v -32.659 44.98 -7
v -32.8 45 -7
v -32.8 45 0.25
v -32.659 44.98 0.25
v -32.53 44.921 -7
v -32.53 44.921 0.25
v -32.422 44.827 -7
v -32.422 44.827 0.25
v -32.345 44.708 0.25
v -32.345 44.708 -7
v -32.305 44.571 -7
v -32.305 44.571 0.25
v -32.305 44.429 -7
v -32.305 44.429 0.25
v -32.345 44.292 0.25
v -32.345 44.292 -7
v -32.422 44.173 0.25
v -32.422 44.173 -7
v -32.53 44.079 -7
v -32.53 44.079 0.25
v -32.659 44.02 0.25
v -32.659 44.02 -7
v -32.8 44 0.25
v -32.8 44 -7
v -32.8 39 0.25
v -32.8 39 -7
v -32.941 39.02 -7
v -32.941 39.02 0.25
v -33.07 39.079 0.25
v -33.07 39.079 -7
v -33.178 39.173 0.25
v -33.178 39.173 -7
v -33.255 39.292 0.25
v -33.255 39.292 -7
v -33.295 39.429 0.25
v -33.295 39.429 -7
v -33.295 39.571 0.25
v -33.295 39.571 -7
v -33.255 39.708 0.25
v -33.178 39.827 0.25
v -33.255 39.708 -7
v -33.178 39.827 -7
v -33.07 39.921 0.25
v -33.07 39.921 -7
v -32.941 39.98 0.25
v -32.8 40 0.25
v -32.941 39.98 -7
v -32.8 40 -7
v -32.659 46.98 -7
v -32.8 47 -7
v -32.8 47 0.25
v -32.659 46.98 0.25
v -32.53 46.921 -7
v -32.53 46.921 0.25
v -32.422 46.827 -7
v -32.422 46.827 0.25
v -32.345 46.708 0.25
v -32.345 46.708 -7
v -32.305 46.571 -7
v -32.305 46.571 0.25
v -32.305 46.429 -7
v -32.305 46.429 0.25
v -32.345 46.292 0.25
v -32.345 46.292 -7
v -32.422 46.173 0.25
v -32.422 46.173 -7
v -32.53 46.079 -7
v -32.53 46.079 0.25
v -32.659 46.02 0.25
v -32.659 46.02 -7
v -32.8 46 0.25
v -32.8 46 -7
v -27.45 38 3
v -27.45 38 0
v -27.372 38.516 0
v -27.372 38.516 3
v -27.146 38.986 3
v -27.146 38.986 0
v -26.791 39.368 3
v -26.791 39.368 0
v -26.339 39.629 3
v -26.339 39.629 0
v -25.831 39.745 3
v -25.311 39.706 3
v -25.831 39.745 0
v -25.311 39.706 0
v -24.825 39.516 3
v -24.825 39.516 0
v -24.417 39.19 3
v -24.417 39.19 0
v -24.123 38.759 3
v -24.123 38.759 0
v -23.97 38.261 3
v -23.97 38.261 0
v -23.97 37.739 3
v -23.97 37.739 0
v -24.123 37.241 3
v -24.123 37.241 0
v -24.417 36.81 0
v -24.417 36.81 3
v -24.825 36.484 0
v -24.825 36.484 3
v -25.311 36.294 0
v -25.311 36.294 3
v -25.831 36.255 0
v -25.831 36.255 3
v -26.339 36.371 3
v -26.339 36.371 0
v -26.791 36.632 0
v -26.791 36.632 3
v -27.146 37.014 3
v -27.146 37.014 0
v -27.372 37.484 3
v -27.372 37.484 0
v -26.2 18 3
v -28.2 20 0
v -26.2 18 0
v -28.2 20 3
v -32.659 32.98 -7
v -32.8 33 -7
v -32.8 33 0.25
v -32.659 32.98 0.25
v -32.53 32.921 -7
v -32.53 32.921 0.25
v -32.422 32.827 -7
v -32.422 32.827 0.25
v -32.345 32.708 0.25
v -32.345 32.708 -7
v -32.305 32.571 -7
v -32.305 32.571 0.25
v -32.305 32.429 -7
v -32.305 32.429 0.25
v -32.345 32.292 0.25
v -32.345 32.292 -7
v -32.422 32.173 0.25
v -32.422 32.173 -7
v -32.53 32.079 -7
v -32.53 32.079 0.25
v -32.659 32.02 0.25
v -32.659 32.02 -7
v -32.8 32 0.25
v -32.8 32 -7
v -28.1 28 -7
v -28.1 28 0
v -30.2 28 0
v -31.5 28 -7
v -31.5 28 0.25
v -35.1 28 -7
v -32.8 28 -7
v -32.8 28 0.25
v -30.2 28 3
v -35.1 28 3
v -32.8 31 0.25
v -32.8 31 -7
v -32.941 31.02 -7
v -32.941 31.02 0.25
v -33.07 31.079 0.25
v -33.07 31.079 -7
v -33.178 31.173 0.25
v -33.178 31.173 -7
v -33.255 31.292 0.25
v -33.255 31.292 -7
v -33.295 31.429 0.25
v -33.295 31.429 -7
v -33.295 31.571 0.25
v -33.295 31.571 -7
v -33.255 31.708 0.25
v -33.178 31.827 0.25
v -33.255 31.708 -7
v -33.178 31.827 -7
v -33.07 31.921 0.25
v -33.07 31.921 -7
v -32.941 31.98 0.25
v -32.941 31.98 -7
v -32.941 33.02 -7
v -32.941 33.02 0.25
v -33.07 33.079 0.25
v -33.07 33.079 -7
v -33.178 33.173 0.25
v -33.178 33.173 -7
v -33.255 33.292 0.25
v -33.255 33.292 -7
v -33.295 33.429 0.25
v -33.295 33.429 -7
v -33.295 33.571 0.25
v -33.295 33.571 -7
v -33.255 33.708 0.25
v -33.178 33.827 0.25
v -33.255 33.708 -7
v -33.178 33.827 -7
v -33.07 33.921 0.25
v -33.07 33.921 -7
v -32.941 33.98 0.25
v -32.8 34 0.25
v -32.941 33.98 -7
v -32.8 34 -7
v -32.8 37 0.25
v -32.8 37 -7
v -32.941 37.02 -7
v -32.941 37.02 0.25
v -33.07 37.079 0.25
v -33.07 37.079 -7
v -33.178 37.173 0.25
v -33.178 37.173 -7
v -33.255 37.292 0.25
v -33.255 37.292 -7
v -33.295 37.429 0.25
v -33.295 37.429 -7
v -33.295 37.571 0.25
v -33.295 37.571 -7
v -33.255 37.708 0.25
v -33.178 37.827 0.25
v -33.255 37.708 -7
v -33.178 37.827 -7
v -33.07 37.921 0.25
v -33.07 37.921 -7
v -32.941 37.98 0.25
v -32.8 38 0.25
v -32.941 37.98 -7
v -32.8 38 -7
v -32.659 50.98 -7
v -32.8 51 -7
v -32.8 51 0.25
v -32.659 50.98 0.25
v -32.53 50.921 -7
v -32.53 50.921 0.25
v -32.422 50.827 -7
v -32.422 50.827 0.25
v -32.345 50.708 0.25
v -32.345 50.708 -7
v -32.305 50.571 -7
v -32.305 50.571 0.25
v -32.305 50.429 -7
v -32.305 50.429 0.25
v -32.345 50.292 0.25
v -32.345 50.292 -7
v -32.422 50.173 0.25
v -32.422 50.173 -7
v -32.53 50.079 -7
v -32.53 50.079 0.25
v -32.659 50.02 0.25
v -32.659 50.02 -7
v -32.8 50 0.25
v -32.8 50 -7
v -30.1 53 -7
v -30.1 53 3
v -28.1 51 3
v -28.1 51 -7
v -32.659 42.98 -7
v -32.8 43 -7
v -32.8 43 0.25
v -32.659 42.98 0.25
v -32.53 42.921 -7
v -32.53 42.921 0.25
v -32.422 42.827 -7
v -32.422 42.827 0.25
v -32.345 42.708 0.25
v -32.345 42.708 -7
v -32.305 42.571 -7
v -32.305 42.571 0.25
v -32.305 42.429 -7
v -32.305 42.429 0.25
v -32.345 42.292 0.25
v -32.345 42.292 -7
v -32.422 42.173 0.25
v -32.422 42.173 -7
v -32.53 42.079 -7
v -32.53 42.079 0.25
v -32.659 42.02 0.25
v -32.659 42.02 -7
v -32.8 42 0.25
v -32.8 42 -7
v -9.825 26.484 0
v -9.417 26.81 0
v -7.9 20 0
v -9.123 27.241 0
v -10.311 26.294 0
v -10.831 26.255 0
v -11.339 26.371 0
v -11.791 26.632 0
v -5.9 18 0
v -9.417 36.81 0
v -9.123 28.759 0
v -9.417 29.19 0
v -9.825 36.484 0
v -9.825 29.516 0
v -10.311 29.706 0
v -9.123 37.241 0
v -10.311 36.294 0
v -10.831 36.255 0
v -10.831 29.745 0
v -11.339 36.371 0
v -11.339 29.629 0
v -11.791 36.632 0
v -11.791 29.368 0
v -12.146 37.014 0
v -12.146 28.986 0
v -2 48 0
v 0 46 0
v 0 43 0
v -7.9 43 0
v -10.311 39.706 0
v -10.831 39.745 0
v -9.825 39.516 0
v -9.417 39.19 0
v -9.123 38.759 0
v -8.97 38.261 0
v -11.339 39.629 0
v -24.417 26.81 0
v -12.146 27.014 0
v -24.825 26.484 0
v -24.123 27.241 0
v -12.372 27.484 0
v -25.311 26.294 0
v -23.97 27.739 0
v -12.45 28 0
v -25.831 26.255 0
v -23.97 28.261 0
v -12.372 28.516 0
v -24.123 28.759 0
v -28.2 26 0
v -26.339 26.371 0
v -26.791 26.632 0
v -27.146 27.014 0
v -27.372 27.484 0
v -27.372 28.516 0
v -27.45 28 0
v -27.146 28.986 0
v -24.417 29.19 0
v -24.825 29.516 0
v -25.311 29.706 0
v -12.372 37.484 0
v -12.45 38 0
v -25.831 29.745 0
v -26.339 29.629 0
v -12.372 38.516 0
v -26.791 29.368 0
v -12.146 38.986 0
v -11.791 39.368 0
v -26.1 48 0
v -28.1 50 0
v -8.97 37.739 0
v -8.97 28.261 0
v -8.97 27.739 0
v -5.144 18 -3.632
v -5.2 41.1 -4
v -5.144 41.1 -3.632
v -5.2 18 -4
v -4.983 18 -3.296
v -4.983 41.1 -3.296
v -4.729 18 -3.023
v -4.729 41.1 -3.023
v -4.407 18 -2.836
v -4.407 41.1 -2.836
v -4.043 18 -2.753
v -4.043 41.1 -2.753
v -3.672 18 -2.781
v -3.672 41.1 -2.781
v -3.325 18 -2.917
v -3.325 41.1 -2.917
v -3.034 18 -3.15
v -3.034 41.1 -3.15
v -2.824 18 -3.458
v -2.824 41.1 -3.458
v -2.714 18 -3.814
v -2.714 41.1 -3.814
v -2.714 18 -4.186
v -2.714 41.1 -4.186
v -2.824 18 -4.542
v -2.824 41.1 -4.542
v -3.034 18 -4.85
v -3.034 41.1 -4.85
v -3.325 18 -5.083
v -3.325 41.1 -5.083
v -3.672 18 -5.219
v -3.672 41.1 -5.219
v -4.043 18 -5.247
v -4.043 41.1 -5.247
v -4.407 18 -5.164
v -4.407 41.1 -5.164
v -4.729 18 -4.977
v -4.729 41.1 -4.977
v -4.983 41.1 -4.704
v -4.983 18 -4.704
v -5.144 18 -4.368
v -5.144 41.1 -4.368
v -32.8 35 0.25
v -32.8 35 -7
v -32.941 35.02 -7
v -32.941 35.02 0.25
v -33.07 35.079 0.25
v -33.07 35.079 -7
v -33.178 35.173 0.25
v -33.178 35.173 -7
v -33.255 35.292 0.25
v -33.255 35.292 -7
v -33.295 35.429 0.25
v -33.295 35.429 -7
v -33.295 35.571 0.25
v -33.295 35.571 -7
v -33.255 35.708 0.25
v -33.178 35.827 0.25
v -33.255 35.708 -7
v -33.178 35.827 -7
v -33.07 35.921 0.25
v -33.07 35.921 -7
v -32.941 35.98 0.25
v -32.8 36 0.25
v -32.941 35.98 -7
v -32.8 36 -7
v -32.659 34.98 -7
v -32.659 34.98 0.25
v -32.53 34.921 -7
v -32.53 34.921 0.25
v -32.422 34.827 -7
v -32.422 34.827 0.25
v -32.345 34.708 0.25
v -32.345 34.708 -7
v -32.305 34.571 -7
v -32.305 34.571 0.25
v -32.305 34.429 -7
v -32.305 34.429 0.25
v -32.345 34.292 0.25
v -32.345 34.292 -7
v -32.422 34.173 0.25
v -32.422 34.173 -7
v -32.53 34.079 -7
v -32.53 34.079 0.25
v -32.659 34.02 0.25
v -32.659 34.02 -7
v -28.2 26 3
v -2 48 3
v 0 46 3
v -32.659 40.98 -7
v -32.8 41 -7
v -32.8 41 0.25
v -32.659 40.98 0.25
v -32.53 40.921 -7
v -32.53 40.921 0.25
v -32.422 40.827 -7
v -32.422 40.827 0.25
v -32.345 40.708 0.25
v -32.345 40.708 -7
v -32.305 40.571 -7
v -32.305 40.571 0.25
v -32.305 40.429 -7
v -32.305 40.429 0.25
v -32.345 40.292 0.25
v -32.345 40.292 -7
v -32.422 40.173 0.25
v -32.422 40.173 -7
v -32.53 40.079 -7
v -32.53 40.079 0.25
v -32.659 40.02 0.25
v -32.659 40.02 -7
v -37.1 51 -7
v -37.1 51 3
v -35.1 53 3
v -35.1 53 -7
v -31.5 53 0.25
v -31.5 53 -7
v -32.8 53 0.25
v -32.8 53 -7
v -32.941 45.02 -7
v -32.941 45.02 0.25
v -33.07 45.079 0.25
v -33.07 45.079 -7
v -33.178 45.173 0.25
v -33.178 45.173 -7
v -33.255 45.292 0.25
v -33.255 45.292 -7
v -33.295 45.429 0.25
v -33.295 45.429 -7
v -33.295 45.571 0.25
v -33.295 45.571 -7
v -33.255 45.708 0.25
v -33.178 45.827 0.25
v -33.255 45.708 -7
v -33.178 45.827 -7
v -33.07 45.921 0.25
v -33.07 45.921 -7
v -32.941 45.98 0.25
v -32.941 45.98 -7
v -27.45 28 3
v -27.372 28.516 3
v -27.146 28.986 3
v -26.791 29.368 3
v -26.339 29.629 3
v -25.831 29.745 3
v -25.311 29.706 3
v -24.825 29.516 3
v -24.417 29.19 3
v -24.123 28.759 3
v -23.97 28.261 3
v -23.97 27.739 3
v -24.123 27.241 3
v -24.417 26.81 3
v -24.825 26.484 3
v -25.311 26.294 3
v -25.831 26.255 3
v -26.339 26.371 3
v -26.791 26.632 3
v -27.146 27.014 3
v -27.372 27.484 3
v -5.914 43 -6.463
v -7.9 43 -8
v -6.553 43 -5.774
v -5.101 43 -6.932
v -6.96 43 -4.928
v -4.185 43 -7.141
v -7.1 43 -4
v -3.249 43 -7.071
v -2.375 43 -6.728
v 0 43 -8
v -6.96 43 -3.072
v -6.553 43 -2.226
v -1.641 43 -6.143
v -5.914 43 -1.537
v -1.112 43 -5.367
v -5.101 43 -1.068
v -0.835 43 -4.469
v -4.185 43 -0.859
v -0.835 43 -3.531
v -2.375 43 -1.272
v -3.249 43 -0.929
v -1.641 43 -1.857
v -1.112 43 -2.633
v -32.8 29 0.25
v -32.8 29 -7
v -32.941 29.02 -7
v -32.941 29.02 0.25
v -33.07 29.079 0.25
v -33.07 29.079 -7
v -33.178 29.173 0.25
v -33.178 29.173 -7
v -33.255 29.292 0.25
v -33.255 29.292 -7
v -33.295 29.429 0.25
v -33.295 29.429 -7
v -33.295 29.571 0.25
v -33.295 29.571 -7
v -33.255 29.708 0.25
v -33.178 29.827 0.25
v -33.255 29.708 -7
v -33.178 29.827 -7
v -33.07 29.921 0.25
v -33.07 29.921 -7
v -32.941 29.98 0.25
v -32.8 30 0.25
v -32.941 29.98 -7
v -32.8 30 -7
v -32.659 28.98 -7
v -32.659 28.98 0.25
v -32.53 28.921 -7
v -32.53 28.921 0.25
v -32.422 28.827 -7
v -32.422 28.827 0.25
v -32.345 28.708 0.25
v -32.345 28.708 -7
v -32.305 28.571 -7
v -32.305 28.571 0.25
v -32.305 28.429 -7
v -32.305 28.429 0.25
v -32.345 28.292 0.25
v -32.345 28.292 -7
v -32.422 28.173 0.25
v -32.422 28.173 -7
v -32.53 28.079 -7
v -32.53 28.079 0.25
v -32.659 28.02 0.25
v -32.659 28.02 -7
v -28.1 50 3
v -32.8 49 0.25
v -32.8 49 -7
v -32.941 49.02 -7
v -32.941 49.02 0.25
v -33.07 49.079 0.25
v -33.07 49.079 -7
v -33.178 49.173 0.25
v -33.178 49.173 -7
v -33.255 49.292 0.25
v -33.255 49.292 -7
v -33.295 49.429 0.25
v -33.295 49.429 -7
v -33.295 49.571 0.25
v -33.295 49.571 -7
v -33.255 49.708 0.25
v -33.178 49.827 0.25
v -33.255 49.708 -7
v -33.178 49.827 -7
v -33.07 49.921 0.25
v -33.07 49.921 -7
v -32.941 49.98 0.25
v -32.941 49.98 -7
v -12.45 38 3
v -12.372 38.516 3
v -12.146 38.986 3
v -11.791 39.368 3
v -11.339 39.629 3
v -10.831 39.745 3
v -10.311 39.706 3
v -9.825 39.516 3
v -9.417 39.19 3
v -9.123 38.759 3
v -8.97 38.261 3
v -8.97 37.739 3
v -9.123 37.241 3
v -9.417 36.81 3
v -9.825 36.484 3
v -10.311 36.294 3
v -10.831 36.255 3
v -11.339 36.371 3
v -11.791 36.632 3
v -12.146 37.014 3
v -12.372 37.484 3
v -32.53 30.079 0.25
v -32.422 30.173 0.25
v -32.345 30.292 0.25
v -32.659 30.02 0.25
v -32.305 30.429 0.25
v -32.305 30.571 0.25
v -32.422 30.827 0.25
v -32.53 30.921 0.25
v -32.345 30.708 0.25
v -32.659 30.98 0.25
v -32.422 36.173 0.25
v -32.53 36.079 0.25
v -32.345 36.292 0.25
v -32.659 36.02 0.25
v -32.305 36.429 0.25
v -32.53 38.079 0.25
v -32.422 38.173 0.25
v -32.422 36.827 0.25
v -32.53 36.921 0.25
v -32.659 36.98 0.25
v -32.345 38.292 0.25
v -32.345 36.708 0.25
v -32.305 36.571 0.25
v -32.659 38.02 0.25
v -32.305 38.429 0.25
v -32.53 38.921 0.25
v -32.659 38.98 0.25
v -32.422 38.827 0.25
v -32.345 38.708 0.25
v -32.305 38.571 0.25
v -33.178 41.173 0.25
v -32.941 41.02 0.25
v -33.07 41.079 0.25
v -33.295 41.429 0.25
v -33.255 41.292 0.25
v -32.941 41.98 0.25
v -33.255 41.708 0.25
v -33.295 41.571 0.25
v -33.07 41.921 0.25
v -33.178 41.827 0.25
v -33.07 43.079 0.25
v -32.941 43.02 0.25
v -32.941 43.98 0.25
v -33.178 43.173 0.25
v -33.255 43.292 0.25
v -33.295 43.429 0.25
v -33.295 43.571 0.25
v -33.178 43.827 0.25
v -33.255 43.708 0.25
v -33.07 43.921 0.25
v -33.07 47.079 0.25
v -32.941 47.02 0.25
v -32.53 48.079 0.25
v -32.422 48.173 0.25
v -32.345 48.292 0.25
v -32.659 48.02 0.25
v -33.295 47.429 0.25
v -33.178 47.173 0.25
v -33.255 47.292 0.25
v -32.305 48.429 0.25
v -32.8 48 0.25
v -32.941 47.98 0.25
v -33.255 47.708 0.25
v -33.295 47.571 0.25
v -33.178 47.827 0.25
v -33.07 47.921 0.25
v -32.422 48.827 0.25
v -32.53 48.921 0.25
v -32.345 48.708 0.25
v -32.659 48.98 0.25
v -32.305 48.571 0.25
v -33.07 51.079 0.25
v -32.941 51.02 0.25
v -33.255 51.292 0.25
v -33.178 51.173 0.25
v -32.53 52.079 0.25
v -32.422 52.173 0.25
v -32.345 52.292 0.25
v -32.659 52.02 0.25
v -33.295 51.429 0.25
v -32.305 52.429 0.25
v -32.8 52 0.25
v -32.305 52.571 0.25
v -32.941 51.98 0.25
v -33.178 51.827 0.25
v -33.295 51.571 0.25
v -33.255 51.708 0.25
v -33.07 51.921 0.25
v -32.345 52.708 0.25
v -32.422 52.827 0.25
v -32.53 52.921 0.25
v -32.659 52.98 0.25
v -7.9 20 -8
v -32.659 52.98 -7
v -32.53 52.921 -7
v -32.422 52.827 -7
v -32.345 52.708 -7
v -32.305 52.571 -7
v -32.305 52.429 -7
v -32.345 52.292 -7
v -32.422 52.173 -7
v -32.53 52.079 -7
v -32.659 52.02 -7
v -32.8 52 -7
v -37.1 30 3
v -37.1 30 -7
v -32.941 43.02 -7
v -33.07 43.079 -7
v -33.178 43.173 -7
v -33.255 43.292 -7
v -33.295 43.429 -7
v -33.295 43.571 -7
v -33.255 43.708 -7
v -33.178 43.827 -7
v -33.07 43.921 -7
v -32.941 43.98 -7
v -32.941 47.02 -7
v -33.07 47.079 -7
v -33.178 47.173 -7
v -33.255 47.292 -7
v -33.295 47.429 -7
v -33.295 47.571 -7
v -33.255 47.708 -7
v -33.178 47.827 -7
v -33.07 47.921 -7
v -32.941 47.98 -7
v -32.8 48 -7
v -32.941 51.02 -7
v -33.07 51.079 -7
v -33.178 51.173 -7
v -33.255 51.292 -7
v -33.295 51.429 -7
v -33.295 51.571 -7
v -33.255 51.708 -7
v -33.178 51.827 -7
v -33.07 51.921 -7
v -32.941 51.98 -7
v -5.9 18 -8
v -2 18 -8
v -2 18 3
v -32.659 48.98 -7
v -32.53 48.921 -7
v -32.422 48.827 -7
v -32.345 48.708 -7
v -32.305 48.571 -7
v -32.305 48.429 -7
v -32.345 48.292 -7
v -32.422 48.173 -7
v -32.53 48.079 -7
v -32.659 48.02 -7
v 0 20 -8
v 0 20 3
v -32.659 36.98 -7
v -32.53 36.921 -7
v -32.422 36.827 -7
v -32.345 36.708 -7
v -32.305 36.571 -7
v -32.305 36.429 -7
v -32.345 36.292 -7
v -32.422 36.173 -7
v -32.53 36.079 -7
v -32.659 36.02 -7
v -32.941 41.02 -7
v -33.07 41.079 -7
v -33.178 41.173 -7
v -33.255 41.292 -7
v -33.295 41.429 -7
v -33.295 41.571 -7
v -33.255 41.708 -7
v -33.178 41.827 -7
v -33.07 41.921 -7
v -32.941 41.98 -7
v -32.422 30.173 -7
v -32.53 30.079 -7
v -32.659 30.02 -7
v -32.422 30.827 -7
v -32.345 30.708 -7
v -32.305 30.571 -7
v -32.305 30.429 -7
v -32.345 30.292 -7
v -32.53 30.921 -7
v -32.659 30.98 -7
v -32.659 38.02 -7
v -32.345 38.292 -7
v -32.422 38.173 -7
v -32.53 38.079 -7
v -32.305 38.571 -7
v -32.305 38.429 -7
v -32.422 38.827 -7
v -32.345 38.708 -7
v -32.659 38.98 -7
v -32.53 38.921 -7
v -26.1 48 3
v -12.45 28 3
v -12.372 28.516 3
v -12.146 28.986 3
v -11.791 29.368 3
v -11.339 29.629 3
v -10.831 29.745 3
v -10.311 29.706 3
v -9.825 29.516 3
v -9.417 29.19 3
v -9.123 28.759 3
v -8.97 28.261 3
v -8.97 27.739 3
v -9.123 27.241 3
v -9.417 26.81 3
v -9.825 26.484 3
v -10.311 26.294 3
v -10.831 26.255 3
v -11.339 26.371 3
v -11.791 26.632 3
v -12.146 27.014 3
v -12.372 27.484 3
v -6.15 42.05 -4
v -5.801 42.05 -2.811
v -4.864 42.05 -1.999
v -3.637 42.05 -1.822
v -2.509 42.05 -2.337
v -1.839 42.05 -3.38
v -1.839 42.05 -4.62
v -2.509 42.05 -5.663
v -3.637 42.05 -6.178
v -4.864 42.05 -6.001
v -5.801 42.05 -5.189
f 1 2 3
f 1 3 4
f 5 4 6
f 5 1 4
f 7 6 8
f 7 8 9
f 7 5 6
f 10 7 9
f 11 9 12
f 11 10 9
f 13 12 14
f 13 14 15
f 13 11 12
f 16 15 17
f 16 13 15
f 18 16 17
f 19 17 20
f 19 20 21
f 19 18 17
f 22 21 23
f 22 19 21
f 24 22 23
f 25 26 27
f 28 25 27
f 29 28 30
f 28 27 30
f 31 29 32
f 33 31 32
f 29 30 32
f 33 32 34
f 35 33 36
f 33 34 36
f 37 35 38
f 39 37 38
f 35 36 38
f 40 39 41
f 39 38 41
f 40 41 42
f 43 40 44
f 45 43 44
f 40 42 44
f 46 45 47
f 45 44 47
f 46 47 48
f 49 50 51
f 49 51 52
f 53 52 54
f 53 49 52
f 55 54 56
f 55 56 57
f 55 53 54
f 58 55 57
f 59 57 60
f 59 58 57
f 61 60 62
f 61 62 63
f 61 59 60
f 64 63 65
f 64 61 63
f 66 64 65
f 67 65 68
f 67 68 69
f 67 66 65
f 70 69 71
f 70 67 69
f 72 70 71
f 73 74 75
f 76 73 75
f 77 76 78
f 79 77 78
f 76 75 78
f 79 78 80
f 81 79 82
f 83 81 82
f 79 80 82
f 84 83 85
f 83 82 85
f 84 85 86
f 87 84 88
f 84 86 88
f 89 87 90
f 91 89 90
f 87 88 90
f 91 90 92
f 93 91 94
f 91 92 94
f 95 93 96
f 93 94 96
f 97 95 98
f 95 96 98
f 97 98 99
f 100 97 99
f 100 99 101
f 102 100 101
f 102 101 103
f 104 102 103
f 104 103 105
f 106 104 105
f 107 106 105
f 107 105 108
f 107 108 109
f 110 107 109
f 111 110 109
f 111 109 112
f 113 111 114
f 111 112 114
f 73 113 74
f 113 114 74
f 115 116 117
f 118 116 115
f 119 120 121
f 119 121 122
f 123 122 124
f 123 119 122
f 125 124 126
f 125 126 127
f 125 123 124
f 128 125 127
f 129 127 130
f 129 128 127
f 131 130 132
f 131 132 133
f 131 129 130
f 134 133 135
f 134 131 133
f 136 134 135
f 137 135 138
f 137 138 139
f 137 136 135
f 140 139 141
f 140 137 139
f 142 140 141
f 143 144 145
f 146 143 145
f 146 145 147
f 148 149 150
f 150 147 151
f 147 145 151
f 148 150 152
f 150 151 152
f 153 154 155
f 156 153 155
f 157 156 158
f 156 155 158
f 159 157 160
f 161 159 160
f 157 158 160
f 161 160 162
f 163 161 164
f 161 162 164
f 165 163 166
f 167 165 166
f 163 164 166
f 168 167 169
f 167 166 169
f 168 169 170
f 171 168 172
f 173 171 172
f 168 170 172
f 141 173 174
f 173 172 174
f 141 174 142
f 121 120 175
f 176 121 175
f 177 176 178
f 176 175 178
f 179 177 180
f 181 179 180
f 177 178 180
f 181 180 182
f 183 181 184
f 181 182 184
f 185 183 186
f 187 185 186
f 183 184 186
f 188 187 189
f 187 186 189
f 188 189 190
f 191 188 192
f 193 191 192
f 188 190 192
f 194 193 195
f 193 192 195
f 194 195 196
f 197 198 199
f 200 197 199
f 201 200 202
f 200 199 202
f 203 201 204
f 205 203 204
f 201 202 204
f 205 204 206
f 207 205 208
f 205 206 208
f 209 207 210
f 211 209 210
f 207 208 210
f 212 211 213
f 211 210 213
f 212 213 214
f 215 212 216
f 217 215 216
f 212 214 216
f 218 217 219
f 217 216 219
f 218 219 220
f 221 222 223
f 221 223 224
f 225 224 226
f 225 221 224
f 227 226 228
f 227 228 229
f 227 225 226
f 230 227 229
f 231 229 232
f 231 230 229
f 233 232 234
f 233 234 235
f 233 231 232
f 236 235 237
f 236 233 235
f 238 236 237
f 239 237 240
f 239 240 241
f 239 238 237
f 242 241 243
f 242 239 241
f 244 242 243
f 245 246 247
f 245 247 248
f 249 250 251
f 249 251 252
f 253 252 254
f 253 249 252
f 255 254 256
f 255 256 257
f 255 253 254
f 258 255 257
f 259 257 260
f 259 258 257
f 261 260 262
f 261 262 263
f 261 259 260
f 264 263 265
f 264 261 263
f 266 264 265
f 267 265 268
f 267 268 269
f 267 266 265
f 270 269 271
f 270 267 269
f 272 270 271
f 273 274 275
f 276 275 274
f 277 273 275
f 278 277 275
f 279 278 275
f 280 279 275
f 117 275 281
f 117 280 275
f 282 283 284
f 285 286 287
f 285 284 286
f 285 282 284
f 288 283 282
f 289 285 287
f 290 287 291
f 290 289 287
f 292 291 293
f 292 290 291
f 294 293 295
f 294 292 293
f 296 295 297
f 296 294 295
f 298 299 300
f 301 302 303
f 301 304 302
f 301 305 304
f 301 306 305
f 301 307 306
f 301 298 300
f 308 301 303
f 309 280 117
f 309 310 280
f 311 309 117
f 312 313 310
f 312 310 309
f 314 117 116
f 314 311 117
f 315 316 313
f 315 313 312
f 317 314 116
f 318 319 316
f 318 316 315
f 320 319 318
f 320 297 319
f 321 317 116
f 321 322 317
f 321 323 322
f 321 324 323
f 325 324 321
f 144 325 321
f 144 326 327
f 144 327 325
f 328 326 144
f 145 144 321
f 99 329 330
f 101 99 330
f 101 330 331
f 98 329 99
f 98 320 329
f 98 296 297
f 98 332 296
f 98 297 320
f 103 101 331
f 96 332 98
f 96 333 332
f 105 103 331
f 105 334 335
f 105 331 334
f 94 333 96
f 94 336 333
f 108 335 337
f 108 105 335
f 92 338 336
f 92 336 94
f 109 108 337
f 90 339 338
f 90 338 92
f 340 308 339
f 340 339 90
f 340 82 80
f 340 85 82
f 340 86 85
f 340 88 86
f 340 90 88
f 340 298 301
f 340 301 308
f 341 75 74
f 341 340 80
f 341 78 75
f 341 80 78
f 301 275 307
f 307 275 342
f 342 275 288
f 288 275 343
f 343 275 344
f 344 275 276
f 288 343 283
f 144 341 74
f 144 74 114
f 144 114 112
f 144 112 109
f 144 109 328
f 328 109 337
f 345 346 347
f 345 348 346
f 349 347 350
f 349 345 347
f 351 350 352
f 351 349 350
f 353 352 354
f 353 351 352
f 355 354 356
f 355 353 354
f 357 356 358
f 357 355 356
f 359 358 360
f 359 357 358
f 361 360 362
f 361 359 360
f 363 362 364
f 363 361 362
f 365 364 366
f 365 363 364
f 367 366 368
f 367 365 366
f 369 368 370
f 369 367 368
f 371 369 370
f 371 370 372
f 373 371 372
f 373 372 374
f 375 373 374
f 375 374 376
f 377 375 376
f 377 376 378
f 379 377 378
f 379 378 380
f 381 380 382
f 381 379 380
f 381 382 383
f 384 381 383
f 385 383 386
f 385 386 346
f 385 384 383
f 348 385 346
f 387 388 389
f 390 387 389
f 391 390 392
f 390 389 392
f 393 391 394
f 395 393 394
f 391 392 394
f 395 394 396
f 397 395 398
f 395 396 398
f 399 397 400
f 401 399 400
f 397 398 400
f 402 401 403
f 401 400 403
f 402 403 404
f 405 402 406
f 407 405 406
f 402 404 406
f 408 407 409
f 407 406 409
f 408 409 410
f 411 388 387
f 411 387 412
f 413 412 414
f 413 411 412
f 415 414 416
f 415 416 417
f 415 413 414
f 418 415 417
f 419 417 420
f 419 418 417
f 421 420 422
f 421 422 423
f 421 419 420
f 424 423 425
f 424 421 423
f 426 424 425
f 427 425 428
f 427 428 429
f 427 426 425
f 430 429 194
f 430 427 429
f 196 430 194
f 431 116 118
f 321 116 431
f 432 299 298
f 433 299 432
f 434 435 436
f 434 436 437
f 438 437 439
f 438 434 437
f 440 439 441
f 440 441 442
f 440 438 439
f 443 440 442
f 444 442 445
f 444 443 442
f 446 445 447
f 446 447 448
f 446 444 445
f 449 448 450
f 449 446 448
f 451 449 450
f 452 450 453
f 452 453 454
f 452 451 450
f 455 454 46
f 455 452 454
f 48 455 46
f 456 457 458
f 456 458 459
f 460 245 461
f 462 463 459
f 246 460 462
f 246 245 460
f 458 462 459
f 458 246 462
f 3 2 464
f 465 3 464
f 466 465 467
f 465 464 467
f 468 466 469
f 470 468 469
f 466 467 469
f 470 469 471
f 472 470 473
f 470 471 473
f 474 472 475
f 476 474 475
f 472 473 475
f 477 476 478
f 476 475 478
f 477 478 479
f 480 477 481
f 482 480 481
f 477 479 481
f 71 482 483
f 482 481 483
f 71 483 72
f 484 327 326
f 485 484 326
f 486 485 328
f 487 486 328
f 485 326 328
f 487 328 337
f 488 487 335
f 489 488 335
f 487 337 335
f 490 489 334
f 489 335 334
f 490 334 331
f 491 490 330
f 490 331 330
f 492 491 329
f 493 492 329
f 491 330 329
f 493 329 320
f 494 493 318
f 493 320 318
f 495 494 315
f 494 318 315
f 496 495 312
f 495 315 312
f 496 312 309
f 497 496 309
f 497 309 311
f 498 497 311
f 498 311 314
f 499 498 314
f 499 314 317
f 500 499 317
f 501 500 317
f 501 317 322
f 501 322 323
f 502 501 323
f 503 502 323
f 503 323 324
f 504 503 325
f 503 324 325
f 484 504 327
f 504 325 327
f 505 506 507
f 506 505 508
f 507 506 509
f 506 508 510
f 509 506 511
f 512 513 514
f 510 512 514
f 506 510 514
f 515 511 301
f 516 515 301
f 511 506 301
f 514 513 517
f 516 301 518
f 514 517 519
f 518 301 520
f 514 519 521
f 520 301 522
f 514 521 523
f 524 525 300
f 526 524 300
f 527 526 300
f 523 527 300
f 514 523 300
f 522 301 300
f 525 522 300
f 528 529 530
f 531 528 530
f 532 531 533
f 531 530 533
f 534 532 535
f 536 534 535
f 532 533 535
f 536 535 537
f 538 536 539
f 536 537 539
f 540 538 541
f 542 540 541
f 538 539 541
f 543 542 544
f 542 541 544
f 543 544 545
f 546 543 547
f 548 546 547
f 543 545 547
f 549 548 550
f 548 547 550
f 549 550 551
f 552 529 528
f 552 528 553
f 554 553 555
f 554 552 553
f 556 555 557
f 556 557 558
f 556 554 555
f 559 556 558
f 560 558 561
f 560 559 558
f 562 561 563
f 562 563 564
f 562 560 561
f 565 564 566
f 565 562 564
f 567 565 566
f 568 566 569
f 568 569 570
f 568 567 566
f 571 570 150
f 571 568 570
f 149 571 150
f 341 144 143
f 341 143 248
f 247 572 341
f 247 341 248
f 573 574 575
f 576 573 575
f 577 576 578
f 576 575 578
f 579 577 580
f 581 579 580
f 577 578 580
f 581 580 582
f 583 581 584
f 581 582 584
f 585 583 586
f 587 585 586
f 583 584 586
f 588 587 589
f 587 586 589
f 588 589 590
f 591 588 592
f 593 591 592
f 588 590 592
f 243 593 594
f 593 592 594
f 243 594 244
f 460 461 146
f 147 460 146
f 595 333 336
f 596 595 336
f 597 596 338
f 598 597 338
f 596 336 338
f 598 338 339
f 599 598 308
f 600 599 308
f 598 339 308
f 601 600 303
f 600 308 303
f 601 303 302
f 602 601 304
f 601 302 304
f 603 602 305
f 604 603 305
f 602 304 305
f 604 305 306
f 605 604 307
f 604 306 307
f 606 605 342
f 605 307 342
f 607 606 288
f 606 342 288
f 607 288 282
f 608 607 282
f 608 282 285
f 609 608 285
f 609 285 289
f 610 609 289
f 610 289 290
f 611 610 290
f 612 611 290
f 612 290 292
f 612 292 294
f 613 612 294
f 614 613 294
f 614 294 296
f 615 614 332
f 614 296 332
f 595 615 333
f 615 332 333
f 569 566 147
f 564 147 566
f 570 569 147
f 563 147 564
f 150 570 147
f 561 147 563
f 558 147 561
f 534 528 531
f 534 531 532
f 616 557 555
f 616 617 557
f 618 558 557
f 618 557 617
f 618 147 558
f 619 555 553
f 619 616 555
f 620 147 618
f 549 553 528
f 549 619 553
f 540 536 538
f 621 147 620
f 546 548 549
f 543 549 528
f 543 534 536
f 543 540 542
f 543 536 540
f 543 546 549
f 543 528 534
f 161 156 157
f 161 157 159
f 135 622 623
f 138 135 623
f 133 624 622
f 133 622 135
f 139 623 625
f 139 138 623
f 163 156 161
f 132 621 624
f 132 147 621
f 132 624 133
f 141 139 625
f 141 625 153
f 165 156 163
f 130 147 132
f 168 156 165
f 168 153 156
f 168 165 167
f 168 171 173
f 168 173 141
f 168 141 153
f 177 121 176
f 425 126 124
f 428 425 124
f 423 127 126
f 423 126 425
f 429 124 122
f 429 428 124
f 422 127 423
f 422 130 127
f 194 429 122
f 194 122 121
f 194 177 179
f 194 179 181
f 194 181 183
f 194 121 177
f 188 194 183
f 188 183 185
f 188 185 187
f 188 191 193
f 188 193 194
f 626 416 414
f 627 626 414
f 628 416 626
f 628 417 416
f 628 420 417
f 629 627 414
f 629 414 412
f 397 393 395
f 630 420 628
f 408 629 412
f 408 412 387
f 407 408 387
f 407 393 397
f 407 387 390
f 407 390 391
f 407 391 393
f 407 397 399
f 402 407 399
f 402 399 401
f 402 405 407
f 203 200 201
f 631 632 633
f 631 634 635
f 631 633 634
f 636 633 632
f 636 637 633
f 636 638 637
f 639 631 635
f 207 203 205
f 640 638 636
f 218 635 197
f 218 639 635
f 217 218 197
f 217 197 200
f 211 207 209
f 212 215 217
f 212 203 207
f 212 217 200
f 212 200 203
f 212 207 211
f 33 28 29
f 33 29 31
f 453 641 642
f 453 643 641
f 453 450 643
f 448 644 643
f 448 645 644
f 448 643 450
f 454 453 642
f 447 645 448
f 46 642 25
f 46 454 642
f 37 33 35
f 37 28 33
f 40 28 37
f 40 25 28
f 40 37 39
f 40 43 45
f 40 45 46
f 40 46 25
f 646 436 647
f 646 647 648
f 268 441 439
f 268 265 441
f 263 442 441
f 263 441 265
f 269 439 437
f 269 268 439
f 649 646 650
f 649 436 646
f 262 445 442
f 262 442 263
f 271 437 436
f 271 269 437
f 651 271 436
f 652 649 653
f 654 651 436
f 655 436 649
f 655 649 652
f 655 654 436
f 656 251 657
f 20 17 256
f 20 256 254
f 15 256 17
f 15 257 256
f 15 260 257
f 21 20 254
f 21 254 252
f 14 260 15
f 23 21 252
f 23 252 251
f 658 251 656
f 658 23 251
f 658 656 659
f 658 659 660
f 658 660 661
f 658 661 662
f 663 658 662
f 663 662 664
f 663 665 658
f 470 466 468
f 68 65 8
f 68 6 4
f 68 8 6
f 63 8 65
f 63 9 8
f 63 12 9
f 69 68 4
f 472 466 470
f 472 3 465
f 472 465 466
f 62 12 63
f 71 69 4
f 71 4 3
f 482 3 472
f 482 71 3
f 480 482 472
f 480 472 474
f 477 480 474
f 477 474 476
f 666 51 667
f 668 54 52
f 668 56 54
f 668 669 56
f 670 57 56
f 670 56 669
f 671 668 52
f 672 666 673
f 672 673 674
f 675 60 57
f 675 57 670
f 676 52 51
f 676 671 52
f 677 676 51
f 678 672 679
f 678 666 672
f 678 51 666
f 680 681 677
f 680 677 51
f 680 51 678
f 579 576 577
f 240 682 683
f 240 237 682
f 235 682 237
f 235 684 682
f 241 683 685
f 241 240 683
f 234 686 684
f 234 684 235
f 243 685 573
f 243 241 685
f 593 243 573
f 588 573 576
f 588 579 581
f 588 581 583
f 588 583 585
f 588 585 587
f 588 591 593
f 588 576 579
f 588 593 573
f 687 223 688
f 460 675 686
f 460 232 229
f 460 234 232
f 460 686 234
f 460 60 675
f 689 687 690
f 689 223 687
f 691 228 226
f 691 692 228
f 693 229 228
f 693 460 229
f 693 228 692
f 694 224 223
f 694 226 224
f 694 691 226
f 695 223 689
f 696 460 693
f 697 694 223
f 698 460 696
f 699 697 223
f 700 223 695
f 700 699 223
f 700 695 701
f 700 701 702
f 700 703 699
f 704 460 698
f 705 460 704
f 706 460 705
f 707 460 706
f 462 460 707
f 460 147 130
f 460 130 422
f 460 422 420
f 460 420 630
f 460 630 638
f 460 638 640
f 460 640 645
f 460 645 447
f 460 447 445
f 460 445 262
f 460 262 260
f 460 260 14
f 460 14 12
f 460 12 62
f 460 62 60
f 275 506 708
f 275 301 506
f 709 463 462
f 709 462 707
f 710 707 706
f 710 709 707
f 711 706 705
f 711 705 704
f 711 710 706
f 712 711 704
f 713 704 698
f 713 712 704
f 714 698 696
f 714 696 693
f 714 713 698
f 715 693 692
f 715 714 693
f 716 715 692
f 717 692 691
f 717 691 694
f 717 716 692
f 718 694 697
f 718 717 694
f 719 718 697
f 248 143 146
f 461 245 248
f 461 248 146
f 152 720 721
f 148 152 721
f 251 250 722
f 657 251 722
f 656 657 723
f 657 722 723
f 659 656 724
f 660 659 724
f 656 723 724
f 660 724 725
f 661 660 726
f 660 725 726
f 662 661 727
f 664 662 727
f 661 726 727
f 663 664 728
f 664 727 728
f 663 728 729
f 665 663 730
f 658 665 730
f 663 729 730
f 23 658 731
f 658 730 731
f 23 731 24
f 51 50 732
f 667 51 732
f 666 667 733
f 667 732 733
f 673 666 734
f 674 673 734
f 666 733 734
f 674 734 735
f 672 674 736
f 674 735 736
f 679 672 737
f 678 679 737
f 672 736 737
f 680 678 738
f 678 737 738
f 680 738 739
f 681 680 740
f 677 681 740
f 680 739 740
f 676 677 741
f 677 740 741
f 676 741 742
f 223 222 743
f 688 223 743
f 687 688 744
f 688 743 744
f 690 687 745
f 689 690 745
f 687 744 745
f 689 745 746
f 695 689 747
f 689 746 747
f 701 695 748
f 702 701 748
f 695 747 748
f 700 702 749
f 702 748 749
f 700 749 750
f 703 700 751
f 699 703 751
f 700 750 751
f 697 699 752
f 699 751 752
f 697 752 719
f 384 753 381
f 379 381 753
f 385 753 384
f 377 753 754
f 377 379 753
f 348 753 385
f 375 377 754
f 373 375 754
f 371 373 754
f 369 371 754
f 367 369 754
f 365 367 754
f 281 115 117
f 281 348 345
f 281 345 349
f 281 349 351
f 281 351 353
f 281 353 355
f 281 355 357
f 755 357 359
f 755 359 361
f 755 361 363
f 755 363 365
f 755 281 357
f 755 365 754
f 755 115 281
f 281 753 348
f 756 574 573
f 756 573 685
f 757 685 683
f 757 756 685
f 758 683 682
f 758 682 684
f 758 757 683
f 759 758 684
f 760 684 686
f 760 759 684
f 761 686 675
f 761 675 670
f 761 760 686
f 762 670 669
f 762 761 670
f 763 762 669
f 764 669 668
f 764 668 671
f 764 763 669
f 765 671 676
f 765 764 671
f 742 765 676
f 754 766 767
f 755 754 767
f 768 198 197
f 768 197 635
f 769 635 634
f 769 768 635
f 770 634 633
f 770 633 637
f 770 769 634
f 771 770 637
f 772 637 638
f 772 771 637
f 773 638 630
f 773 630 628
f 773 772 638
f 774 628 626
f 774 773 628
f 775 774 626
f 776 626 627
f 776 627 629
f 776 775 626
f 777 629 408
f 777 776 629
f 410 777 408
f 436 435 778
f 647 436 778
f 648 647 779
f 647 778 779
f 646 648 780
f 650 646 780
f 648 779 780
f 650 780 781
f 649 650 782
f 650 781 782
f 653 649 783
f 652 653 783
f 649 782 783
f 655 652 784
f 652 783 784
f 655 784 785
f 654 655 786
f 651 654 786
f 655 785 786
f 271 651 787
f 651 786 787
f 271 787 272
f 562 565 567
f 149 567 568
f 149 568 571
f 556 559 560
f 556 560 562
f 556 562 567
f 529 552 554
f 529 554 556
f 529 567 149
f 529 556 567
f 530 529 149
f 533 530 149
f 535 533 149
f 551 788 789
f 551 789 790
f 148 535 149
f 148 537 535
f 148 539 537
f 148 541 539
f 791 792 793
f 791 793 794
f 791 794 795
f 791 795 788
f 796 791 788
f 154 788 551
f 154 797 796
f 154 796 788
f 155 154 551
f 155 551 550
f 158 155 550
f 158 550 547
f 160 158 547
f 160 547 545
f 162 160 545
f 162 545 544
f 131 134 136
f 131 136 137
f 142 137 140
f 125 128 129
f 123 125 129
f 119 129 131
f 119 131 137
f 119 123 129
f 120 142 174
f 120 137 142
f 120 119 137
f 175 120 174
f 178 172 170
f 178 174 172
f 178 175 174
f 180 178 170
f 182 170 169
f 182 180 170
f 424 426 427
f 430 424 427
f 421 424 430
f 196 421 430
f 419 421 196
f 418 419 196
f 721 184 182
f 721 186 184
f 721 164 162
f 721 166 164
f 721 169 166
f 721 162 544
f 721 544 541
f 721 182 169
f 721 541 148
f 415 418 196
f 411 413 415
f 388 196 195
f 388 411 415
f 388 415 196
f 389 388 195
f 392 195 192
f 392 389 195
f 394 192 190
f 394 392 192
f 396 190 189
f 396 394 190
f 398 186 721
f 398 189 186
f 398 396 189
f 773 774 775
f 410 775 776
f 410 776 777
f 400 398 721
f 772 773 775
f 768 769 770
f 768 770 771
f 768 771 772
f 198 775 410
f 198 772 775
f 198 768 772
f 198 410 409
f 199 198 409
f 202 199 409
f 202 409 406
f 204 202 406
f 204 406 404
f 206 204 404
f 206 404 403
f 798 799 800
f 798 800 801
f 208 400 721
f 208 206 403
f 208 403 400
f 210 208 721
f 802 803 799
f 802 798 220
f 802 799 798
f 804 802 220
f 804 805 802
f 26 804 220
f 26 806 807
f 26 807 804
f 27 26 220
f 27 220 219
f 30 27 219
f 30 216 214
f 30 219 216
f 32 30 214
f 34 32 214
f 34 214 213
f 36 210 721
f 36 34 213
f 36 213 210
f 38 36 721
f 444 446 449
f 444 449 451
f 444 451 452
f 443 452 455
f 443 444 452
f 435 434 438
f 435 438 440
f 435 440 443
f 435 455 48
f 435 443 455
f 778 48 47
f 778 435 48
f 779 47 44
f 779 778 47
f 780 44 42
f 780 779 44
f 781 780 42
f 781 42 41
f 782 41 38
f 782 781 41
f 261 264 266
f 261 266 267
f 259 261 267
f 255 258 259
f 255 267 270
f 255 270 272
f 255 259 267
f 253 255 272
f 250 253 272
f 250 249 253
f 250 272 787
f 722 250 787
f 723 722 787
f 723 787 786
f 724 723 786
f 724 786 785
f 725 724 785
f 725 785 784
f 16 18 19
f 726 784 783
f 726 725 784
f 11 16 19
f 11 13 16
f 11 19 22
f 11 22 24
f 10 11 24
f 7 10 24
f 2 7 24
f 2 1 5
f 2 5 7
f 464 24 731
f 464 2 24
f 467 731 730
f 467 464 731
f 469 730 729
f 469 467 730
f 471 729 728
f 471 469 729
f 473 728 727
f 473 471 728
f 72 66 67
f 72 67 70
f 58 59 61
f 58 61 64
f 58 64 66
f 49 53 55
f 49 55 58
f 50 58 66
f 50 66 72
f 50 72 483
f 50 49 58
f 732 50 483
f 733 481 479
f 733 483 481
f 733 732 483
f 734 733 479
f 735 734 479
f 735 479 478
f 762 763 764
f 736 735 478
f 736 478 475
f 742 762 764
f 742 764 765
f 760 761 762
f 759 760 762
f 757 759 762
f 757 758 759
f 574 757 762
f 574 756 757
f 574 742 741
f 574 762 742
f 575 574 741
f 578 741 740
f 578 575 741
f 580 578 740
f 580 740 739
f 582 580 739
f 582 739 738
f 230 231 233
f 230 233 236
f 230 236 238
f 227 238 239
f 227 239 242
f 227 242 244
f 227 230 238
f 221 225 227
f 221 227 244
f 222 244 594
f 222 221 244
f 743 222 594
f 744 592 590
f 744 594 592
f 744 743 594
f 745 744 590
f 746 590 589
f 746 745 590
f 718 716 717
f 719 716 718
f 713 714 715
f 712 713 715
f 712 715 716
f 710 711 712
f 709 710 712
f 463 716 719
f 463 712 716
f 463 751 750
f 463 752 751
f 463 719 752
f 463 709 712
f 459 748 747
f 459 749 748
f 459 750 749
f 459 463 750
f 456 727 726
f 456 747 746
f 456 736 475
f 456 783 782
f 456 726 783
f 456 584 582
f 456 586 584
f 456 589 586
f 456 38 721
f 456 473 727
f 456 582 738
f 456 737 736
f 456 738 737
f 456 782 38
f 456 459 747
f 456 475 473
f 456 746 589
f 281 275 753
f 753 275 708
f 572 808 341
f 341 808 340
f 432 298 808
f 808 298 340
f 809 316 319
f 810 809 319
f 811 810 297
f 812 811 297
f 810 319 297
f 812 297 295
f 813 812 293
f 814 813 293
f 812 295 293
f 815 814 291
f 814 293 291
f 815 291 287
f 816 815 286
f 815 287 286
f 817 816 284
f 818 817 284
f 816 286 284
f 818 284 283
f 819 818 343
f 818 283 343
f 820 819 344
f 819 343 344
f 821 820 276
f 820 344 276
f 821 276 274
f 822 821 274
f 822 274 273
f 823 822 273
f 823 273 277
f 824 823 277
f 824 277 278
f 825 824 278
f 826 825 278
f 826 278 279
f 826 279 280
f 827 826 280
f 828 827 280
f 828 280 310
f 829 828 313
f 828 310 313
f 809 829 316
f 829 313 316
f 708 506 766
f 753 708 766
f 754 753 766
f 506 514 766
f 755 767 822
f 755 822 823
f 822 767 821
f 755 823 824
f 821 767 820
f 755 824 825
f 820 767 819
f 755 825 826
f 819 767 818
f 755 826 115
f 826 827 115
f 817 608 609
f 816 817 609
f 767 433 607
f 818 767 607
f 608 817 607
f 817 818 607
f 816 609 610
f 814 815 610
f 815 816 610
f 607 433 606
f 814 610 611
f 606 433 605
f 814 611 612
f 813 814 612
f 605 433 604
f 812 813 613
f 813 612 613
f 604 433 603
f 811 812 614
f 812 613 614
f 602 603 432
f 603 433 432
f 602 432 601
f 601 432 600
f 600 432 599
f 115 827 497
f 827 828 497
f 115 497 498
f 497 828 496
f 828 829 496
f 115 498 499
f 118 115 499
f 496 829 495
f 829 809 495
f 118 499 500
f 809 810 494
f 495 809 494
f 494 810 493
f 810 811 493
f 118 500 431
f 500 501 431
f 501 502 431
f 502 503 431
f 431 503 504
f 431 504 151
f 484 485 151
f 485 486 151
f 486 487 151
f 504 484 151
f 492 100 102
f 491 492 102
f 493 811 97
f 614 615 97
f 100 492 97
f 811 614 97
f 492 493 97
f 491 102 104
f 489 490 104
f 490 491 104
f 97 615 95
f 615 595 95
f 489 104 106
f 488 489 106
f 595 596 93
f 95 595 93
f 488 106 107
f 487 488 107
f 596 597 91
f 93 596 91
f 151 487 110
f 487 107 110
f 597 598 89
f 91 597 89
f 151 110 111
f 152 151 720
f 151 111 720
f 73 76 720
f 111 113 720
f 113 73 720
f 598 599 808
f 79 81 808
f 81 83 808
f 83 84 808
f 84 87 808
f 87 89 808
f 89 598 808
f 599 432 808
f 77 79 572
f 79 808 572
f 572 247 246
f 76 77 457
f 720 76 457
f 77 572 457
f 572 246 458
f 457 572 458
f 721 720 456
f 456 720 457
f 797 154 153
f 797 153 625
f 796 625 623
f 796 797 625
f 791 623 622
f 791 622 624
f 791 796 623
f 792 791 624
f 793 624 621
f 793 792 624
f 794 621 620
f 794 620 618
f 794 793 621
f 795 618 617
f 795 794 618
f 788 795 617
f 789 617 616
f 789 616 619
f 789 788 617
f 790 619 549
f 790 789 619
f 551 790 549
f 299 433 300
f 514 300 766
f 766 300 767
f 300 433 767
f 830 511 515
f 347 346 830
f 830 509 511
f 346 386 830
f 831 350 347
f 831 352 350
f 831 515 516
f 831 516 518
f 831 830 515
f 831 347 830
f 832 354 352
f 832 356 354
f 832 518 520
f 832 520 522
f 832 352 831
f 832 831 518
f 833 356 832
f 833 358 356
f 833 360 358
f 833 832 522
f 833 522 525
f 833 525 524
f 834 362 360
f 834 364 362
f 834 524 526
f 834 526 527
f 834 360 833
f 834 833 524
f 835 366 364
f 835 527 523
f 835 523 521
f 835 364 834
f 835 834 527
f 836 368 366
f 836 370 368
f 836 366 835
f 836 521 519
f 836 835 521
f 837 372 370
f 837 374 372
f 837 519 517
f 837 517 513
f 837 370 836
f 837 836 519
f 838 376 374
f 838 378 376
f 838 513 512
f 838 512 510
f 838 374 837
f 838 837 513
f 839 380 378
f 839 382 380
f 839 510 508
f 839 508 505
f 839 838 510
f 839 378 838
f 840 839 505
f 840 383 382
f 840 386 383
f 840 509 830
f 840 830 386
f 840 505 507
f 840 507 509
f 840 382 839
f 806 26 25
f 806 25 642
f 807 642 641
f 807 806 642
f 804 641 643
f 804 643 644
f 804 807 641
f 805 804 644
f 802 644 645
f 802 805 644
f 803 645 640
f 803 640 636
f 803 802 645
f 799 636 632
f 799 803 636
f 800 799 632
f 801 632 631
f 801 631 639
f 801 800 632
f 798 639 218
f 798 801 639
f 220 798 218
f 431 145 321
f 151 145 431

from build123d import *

# Parameters (mm, degrees)
SKETCH_W         = 28.2
SKETCH_H         = 30
SKETCH_R         = 1.75
PAD_DEPTH        = 3
SKETCH002_W      = 9
SKETCH002_H      = 25
SKETCH002_W_2    = 7.9
PAD002_DEPTH     = 10
POCKET_DEPTH     = 7.25
POCKET_FACE46_W  = 25
POCKET_FACE46_H  = 7.9
PAD003_DEPTH     = 1
HOLE_D           = 2.5
HOLE_DEPTH       = 30
HOLE_CSINK_D     = 6.3
HOLE_CSINK_ANGLE = 90
CHAMFER_SIZE     = 2


with BuildPart() as inverted_body:
    # Sketch → Pad (new body)
    with BuildSketch(Plane.XY):
        with Locations((14.1, 33)):
            Rectangle(SKETCH_W, SKETCH_H)
        with Locations((10.7, 38)):
            Circle(SKETCH_R, mode=Mode.SUBTRACT)
        with Locations((25.7, 38)):
            Circle(SKETCH_R, mode=Mode.SUBTRACT)
        with Locations((25.7, 28)):
            Circle(SKETCH_R, mode=Mode.SUBTRACT)
        with Locations((10.7, 28)):
            Circle(SKETCH_R, mode=Mode.SUBTRACT)
    extrude(amount=PAD_DEPTH)

    # Sketch002 (on DatumPlane) → Pad002 (join)
    with BuildSketch(Plane.XY.offset(3)):
        with Locations((32.6, 40.5)):
            Rectangle(SKETCH002_W, SKETCH002_H)
        with Locations((3.95, 30.5)):
            Rectangle(SKETCH002_W_2, SKETCH002_H)
    extrude(amount=-PAD002_DEPTH)

    # Sketch003 → Pocket (cut)
    with BuildSketch(Plane(origin=(-0.5, 10, -7), x_dir=(1, 0, 0), z_dir=(0, 0, 1))):
        with BuildLine():
            Line((33.3, 48), (32, 48))
            Line((32, 48), (32, 18))
            Line((32, 18), (33.3, 18))
            ThreePointArc((33.3, 19), (32.8, 18.5), (33.3, 18))
            ThreePointArc((33.3, 19), (33.8, 19.5), (33.3, 20))
            ThreePointArc((33.3, 21), (32.8, 20.5), (33.3, 20))
            ThreePointArc((33.3, 21), (33.8, 21.5), (33.3, 22))
            ThreePointArc((33.3, 23), (32.8, 22.5), (33.3, 22))
            ThreePointArc((33.3, 23), (33.8, 23.5), (33.3, 24))
            ThreePointArc((33.3, 25), (32.8, 24.5), (33.3, 24))
            ThreePointArc((33.3, 25), (33.8, 25.5), (33.3, 26))
            ThreePointArc((33.3, 27), (32.8, 26.5), (33.3, 26))
            ThreePointArc((33.3, 27), (33.8, 27.5), (33.3, 28))
            ThreePointArc((33.3, 29), (32.8, 28.5), (33.3, 28))
            ThreePointArc((33.3, 29), (33.8, 29.5), (33.3, 30))
            ThreePointArc((33.3, 31), (32.8, 30.5), (33.3, 30))
            ThreePointArc((33.3, 31), (33.8, 31.5), (33.3, 32))
            ThreePointArc((33.3, 33), (32.8, 32.5), (33.3, 32))
            ThreePointArc((33.3, 33), (33.8, 33.5), (33.3, 34))
            ThreePointArc((33.3, 35), (32.8, 34.5), (33.3, 34))
            ThreePointArc((33.3, 35), (33.8, 35.5), (33.3, 36))
            ThreePointArc((33.3, 37), (32.8, 36.5), (33.3, 36))
            ThreePointArc((33.3, 37), (33.8, 37.5), (33.3, 38))
            ThreePointArc((33.3, 39), (32.8, 38.5), (33.3, 38))
            ThreePointArc((33.3, 39), (33.8, 39.5), (33.3, 40))
            ThreePointArc((33.3, 41), (32.8, 40.5), (33.3, 40))
            ThreePointArc((33.3, 41), (33.8, 41.5), (33.3, 42))
            ThreePointArc((33.3, 43), (32.8, 42.5), (33.3, 42))
            ThreePointArc((33.3, 43), (33.8, 43.5), (33.3, 44))
            ThreePointArc((33.3, 45), (32.8, 44.5), (33.3, 44))
            ThreePointArc((33.3, 45), (33.8, 45.5), (33.3, 46))
            ThreePointArc((33.3, 47), (32.8, 46.5), (33.3, 46))
            ThreePointArc((33.3, 47), (33.8, 47.5), (33.3, 48))
        make_face()
    extrude(amount=POCKET_DEPTH, mode=Mode.SUBTRACT)

    # Pocket Face46 → Pad003 (add)
    with BuildSketch(Plane(origin=(3.95, 30.5, -7), x_dir=(0, -1, 0), z_dir=(0, 0, -1))):
        Rectangle(POCKET_FACE46_W, POCKET_FACE46_H)
    extrude(amount=PAD003_DEPTH)

    # Hole
    with Locations(Plane(origin=(0, 43, 0), x_dir=(-1, 0, 0), z_dir=(0, 1, 0))):
        with Locations((-3.95, -4)):
            CounterSinkHole(HOLE_D / 2, HOLE_CSINK_D / 2, depth=HOLE_DEPTH, counter_sink_angle=HOLE_CSINK_ANGLE)

    # Chamfer
    chamfer_edges = [inverted_body.edges().sort_by_distance(p)[0] for p in [
        (28.1, 53, -2),
        (37.1, 53, -2),
        (0, 48, 1.5),
        (0, 18, -2),
        (7.9, 18, -3.5),
        (28.2, 18, 1.5),
        (37.1, 28, -2),
        (7.9, 18, -7.5),
        (0, 18, -7.5),
        (28.2, 28, 1.5),
        (28.1, 48, 1.5),
    ]]
    chamfer(chamfer_edges, length=CHAMFER_SIZE)


with BuildPart() as body:
    # Part__Mirroring: instance of inverted-body
    add(inverted_body.part.mirror(Plane(origin=(0, 0, 0), x_dir=(0, -1, 0), z_dir=(1, 0, 0))))


solid = body.part
